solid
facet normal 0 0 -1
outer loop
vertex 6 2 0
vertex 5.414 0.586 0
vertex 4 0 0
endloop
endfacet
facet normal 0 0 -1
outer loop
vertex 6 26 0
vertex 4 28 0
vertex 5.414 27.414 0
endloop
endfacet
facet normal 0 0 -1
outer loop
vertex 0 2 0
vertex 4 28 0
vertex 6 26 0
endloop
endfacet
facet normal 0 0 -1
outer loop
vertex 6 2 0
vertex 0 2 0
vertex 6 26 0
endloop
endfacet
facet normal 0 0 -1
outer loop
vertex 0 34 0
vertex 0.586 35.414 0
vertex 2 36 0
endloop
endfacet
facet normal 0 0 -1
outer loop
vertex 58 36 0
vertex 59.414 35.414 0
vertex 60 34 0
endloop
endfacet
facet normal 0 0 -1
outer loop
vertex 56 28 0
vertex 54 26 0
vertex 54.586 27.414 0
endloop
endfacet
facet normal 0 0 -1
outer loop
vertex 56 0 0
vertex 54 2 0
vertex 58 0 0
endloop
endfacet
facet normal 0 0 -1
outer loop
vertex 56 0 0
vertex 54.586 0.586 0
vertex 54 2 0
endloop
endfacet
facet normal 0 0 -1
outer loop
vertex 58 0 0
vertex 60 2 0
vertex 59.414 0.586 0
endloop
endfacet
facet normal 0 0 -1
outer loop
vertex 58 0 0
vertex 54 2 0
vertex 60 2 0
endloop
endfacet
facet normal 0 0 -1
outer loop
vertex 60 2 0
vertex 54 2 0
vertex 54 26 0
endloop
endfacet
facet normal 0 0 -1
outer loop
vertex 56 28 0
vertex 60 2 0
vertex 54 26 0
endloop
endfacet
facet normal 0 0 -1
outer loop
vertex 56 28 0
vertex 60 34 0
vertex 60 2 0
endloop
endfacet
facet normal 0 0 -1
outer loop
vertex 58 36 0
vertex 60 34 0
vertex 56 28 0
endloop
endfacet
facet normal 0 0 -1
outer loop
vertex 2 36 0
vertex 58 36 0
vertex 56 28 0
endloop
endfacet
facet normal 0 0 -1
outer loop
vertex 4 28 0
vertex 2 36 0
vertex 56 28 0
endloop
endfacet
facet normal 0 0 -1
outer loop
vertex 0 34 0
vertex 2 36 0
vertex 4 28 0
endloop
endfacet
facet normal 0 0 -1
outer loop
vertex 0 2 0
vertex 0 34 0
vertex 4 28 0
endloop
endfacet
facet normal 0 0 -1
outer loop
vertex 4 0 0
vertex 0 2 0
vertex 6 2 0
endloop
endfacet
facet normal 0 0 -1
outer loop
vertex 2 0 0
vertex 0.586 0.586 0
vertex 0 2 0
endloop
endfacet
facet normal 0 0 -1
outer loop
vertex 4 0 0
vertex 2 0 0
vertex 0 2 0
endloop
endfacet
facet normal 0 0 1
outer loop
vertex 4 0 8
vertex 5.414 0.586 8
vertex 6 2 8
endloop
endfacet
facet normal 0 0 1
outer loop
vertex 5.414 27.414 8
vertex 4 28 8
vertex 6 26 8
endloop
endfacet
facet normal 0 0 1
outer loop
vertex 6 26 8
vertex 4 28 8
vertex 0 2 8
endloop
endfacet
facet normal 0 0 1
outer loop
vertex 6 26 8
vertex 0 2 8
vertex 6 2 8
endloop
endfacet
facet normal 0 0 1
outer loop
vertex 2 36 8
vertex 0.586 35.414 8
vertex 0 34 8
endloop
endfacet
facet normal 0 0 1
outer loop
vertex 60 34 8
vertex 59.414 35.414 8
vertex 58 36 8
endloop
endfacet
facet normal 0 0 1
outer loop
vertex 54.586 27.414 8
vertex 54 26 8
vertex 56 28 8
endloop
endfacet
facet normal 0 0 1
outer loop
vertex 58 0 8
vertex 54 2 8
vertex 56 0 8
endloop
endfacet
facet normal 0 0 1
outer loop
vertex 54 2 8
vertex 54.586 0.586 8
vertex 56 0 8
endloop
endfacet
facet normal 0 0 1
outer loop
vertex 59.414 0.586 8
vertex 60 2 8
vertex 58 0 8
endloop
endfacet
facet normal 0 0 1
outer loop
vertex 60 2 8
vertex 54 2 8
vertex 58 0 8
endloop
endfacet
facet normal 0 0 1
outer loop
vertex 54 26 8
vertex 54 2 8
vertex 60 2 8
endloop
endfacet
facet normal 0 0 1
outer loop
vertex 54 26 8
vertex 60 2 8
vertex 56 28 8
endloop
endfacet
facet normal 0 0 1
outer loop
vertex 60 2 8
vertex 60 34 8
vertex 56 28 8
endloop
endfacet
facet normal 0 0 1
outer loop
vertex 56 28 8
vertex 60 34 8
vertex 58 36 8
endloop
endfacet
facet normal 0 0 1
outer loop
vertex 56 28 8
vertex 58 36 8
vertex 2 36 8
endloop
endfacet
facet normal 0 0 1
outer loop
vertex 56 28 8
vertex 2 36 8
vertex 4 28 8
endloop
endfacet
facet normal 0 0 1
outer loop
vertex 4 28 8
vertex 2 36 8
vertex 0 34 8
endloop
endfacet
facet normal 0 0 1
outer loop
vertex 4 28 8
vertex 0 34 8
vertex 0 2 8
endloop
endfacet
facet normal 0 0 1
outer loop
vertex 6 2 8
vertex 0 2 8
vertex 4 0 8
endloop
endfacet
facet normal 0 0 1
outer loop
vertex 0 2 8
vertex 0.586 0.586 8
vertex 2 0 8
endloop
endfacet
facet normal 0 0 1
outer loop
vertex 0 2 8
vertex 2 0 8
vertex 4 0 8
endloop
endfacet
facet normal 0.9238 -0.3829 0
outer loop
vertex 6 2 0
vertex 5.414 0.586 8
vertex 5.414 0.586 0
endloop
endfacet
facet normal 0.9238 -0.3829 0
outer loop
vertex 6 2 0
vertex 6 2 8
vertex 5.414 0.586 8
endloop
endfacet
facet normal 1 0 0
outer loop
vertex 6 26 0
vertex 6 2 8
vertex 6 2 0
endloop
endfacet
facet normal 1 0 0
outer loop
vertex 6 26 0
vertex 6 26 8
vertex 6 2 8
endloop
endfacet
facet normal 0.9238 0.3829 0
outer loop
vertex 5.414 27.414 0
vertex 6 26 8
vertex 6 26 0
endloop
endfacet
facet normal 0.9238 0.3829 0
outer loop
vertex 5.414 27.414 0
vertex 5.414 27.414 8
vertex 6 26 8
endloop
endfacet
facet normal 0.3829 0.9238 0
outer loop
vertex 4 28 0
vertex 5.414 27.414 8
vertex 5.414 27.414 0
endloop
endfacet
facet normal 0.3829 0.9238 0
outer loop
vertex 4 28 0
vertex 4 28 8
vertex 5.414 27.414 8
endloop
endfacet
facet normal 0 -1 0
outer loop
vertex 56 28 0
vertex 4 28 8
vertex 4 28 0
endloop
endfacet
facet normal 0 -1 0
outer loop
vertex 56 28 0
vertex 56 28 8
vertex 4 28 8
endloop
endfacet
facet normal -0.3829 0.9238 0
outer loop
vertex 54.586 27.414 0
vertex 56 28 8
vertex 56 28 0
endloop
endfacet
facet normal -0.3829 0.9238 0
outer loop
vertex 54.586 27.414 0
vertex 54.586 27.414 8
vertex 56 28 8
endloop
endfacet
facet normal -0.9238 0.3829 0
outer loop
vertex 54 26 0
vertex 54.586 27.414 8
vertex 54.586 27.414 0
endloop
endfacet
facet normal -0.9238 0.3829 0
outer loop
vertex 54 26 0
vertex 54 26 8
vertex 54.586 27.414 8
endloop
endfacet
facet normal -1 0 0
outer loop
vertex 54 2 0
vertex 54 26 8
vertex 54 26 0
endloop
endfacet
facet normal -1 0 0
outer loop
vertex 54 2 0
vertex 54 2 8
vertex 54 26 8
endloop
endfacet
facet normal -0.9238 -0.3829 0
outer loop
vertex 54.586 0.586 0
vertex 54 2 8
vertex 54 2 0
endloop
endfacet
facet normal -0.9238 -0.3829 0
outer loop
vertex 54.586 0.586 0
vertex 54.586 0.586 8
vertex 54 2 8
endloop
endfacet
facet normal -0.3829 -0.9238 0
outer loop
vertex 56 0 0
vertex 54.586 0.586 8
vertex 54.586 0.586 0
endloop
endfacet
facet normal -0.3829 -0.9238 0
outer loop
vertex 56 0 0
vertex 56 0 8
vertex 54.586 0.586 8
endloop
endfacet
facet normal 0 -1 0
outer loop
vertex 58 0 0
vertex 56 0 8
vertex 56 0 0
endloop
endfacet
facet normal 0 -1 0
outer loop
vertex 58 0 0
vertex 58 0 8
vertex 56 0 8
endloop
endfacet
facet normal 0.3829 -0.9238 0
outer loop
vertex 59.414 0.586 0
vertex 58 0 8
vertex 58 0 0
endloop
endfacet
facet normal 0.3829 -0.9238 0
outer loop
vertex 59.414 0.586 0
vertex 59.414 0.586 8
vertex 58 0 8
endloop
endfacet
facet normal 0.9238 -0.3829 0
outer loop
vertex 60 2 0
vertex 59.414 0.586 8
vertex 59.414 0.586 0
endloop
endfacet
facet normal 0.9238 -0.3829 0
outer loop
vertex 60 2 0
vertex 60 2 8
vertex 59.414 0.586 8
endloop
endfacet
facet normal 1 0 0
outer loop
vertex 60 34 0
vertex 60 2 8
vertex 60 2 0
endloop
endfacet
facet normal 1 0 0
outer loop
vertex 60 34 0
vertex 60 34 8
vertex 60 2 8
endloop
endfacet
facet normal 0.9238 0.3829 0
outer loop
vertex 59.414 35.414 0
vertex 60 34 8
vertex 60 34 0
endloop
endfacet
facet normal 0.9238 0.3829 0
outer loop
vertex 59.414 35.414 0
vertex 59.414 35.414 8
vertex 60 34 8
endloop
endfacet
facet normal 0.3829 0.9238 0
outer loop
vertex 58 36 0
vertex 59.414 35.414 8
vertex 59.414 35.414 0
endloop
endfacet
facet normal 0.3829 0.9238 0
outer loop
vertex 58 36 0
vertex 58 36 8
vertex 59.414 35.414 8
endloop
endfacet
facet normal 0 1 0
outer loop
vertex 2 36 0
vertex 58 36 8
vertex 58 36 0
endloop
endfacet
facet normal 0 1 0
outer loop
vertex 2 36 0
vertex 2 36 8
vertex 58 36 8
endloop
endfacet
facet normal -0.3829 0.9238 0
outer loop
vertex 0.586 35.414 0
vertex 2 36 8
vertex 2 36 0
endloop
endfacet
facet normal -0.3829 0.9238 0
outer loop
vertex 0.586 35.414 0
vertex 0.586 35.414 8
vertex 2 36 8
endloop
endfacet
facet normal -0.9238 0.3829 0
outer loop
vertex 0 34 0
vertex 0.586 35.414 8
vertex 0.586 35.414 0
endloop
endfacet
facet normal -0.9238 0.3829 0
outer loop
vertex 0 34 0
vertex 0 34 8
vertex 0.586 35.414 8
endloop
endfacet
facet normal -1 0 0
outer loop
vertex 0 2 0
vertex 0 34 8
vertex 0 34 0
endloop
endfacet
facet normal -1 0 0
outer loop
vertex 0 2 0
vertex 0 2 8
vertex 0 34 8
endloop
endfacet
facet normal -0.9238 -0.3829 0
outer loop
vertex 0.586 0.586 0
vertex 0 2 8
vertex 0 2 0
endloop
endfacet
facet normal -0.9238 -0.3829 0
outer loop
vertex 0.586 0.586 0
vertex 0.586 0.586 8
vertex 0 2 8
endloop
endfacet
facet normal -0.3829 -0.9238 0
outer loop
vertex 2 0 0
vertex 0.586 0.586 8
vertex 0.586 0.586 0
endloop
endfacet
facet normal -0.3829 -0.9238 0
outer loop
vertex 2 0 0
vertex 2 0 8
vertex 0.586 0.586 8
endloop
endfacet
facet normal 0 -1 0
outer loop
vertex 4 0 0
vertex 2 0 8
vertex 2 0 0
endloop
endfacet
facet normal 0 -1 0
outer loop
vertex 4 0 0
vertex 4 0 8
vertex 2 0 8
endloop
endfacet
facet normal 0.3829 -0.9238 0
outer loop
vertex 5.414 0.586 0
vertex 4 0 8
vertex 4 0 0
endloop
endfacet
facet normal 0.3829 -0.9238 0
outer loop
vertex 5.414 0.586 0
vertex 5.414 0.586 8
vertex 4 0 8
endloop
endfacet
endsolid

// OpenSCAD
$fn = 32;

// ----------------------------------------------------------------------
// Clip blank: staple clip, 8 mm thick
// ----------------------------------------------------------------------

// --- parameters (mm) ---
profile_height = 8;       // extrusion height
profile_points = 24;      // points of the closed outline

profile = [[0, 2], [0.586, 0.586], [2, 0], [4, 0], [5.414, 0.586], [6, 2], [6, 26], [5.414, 27.414], [4, 28], [56, 28], [54.586, 27.414], [54, 26], [54, 2], [54.586, 0.586], [56, 0], [58, 0], [59.414, 0.586], [60, 2], [60, 34], [59.414, 35.414], [58, 36], [2, 36], [0.586, 35.414], [0, 34]];  // single closed polygon, 24 points, counter clockwise

// --- the one profile operation ---
linear_extrude(height = profile_height) polygon(points = profile);
